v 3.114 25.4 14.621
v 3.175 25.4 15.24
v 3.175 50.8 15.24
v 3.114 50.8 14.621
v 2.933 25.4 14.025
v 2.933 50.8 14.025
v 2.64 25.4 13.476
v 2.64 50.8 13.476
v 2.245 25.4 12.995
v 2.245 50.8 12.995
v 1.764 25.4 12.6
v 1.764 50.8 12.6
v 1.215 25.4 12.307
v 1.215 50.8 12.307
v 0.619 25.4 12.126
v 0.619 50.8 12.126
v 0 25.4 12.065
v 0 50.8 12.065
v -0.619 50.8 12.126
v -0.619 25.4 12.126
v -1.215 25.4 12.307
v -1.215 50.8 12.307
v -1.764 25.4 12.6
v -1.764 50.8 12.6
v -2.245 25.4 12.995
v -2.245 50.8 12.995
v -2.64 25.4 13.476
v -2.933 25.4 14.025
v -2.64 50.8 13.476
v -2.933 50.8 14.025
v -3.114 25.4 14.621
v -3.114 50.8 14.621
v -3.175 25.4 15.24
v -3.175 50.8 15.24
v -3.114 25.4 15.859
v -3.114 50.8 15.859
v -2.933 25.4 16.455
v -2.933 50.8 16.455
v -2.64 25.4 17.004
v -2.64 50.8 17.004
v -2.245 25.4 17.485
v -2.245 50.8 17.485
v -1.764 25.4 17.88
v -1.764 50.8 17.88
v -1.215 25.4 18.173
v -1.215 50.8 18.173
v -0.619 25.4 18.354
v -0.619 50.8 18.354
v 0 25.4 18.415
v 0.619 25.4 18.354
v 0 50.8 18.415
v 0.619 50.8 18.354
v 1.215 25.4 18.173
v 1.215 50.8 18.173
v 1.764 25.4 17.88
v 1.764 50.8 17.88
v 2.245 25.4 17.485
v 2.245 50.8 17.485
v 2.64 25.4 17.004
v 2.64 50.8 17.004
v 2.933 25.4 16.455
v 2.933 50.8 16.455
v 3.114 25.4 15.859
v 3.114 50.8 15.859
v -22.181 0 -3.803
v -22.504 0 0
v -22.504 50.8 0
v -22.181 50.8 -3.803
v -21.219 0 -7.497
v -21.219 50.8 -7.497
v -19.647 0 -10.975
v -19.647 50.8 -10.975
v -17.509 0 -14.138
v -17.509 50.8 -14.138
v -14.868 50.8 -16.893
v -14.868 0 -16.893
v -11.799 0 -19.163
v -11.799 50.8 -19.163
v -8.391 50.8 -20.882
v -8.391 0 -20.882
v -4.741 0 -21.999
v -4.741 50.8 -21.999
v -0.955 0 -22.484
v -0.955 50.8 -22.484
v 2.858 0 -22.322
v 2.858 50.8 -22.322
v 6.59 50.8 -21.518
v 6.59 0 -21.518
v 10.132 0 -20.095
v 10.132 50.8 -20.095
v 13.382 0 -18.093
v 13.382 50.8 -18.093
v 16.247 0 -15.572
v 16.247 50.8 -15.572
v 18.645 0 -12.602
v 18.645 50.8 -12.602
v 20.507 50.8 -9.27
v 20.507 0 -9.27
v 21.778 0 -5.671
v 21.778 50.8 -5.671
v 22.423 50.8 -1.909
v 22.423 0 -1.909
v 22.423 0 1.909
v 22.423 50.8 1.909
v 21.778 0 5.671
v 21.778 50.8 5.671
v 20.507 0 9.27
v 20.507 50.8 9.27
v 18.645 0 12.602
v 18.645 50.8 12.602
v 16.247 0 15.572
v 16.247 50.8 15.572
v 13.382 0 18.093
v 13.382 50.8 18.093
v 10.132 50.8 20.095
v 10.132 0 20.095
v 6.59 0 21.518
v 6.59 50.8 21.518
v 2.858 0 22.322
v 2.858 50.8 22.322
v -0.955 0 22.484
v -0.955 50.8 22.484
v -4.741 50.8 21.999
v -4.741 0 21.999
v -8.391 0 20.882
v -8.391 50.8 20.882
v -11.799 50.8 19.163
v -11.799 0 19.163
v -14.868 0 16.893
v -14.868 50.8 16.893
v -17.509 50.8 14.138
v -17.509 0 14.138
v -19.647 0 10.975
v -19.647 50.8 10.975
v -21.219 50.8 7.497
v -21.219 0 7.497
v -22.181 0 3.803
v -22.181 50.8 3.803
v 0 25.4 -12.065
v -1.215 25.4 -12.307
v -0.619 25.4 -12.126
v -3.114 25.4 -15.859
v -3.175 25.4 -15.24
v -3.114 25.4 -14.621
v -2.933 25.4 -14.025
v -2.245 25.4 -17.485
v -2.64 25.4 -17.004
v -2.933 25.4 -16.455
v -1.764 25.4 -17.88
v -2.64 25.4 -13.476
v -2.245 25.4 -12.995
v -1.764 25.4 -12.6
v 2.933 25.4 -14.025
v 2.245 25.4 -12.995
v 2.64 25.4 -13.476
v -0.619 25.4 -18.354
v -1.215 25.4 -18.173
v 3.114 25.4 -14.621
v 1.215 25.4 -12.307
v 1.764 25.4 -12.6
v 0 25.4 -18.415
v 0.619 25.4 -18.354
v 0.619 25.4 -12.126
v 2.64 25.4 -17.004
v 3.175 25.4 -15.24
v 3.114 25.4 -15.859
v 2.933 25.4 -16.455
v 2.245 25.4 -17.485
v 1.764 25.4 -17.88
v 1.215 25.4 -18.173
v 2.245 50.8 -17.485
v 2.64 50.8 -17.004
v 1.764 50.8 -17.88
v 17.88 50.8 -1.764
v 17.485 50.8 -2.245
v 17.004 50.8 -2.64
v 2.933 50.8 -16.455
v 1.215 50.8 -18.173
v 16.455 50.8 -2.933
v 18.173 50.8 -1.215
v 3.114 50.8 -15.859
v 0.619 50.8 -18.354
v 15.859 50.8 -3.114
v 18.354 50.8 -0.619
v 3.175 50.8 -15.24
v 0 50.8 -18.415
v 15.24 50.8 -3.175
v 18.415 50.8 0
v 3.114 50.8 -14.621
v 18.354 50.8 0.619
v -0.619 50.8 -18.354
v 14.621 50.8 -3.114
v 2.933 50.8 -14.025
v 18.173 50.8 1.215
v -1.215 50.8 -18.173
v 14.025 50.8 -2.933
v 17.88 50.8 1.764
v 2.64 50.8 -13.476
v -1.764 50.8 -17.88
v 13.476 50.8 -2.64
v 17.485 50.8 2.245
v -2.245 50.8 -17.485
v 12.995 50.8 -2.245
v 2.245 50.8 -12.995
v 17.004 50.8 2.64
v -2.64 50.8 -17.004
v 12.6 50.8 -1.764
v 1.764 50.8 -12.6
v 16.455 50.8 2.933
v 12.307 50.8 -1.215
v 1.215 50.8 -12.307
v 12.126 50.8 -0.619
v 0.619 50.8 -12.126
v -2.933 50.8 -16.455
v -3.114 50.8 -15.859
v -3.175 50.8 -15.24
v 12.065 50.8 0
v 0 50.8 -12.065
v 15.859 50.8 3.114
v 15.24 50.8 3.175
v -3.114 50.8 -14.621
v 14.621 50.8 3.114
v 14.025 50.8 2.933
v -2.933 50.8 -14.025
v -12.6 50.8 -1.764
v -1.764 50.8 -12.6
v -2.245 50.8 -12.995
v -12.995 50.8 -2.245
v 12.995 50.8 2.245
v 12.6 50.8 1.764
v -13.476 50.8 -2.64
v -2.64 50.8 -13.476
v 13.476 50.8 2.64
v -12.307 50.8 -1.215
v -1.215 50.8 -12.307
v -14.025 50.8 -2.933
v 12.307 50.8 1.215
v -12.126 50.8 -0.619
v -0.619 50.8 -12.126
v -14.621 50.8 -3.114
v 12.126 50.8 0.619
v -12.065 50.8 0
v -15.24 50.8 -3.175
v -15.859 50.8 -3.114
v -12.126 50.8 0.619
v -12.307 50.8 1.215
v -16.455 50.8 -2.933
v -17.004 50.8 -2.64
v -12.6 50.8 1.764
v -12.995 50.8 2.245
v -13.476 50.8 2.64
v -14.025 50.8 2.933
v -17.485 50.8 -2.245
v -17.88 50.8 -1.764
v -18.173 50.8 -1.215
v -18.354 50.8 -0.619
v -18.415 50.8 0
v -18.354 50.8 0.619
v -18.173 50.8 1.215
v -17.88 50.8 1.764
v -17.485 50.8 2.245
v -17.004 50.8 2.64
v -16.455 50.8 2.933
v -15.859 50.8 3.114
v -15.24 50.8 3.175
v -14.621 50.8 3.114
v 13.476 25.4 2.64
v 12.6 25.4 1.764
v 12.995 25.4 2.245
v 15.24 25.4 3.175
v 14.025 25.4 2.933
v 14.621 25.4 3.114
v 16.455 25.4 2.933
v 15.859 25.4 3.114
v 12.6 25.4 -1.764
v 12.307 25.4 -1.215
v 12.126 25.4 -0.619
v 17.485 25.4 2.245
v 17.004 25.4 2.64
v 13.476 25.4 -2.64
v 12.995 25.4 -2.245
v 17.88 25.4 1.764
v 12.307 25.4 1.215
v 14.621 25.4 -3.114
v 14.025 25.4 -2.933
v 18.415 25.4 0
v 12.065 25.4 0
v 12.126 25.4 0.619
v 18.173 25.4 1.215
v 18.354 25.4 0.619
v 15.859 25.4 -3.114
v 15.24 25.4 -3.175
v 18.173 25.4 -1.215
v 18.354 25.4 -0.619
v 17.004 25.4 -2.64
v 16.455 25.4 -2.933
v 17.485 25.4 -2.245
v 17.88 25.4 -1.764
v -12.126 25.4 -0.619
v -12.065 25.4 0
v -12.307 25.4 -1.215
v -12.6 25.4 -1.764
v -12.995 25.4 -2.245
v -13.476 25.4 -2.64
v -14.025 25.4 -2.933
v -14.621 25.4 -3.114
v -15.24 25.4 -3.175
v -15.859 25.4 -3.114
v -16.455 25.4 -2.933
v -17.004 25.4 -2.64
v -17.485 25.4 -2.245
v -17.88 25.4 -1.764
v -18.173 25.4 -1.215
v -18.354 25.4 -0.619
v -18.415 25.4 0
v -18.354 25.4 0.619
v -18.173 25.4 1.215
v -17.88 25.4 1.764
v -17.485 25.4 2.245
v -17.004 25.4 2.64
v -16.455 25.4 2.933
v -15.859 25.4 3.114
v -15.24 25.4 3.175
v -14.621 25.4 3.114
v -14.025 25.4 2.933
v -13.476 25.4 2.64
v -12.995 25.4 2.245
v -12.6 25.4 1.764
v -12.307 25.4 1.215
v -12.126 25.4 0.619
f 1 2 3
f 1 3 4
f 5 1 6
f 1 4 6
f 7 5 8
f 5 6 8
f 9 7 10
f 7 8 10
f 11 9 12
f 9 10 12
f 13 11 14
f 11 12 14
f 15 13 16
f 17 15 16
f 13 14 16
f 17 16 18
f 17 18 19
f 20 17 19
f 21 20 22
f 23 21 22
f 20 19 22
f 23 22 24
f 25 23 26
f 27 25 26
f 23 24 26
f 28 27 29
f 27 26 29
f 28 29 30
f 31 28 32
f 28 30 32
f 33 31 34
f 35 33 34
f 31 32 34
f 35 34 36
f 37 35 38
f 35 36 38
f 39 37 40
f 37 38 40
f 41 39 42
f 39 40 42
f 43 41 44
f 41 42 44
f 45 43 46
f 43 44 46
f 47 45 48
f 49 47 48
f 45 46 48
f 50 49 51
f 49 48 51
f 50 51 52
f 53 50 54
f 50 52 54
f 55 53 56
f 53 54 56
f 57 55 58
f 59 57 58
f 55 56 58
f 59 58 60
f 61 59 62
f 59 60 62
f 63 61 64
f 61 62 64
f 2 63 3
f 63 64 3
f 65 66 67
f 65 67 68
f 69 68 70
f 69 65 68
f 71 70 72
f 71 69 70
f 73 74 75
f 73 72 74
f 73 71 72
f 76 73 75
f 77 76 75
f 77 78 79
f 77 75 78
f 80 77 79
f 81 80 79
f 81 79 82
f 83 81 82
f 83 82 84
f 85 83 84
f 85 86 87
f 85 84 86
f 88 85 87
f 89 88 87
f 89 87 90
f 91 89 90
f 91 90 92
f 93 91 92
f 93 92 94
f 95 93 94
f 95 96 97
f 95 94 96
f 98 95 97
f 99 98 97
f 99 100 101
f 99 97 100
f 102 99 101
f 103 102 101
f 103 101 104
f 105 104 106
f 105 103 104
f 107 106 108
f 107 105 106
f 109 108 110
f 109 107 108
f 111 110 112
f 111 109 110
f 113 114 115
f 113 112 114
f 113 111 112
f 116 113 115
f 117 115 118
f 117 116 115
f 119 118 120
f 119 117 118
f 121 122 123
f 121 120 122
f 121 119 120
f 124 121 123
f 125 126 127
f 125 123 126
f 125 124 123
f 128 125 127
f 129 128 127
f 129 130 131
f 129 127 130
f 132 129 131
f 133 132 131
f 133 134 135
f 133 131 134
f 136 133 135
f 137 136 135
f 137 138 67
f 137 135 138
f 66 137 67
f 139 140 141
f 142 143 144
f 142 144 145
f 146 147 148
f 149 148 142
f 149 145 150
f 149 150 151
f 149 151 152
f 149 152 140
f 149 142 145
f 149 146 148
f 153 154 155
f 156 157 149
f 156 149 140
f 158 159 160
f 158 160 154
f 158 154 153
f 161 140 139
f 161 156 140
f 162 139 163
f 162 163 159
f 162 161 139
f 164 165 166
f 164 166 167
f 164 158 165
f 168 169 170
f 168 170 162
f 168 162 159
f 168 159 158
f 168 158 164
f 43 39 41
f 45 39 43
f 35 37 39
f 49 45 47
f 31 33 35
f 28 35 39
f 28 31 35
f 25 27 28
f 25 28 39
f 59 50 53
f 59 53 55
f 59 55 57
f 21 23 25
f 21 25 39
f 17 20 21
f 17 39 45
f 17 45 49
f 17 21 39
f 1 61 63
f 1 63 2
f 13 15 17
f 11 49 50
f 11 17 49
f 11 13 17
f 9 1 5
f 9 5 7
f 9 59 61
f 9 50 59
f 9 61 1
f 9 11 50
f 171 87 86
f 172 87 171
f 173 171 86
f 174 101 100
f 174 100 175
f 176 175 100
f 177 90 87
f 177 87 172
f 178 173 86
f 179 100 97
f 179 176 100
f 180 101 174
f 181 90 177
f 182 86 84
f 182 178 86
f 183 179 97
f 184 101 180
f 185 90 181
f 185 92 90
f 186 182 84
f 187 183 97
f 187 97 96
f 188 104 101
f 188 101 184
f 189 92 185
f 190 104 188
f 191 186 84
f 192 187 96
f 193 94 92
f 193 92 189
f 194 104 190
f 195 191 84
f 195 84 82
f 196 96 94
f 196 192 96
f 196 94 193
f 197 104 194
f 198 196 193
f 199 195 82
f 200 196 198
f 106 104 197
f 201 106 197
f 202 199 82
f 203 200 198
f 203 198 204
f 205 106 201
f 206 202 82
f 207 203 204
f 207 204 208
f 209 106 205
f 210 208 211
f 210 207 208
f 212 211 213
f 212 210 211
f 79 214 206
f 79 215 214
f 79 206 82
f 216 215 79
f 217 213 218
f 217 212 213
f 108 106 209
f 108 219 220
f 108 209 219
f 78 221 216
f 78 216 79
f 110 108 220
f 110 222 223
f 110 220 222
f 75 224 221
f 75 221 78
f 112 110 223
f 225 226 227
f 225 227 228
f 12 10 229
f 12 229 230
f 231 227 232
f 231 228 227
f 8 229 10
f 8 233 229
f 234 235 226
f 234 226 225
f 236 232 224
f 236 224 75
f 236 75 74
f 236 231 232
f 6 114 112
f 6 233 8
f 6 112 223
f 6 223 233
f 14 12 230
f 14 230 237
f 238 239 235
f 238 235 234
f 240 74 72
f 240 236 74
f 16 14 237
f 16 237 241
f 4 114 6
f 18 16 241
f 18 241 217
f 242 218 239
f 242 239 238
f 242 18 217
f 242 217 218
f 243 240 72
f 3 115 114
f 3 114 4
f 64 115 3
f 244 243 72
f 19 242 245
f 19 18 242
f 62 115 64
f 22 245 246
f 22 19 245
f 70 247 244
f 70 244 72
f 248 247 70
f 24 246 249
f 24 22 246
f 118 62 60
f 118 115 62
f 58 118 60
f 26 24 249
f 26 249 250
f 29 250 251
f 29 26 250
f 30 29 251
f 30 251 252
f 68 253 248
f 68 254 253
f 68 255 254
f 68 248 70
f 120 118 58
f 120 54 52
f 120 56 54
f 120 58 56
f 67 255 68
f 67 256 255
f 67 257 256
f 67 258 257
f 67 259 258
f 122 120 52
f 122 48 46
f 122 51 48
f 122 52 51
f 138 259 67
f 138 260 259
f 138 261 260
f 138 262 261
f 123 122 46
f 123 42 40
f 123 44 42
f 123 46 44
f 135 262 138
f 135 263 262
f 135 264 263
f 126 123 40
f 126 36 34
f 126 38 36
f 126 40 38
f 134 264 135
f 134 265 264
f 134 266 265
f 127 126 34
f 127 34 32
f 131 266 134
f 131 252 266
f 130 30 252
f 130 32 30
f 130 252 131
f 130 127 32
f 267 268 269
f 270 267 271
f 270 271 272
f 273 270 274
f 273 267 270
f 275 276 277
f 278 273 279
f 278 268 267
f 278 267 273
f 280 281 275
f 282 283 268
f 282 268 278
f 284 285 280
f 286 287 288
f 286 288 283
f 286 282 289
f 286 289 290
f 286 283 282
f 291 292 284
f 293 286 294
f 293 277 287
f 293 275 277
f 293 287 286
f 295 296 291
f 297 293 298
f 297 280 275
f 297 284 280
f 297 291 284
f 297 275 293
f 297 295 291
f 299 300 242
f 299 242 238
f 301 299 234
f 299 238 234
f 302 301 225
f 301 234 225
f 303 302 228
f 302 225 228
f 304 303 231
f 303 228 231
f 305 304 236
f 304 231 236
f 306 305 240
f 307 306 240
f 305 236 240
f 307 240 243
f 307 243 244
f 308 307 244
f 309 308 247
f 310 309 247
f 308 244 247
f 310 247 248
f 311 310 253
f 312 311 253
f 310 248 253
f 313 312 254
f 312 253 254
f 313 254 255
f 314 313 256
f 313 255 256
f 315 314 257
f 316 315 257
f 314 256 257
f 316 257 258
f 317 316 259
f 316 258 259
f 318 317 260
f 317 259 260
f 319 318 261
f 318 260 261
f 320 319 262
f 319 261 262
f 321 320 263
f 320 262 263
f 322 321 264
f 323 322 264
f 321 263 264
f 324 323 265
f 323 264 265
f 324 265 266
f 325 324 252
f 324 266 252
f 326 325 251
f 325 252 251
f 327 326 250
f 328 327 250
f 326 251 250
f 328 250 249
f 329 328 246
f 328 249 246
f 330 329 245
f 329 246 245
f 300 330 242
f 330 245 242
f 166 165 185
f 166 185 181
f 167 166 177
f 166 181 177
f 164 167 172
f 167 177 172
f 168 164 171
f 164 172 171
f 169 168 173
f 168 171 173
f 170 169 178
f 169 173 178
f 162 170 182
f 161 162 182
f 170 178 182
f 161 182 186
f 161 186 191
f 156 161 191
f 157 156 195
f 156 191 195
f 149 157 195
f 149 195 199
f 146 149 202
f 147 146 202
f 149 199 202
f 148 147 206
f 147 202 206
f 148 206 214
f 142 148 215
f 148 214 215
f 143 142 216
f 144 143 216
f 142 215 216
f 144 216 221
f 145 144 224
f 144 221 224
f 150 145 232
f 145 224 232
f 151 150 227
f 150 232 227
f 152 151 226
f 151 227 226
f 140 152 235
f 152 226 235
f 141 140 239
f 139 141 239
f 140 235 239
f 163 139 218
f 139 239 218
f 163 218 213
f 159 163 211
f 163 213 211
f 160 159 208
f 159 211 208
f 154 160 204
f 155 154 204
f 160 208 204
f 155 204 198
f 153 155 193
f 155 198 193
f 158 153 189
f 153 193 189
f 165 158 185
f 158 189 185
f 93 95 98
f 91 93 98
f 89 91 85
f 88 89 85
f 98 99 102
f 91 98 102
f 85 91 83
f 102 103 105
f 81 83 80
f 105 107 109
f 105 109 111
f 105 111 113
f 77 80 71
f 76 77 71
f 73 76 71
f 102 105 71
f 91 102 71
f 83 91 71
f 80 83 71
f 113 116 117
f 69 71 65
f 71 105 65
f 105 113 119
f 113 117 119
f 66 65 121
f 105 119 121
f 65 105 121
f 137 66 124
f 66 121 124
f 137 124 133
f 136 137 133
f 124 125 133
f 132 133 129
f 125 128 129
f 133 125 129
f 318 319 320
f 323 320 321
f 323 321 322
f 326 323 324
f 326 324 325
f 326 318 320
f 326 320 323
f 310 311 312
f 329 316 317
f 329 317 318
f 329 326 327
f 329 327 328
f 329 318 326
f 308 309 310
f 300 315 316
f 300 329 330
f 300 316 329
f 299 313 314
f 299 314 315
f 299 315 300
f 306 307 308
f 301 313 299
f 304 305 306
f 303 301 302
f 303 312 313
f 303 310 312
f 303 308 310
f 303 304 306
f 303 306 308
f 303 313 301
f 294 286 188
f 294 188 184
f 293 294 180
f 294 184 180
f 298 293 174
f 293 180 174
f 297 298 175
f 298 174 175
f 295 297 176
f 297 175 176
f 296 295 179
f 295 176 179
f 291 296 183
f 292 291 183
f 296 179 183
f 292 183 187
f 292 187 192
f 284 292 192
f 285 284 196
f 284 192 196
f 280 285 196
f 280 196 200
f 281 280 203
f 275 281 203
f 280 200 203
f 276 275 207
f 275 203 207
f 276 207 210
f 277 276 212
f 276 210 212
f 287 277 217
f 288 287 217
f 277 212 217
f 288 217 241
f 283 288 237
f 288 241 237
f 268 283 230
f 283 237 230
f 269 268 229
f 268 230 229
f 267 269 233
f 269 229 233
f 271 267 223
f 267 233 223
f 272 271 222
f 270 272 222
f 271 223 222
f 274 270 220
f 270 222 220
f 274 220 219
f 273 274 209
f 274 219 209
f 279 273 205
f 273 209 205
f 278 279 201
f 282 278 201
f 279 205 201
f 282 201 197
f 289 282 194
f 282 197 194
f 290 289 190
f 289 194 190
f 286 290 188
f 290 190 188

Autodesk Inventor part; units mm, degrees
ref_plane "YZ Plane" through (0, 0, 0) normal (1, 0, 0) x (0, 1, 0)
ref_plane "XZ Plane" through (0, 0, 0) normal (0, 1, 0) x (-1, 0, 0)
ref_plane "XY Plane" through (0, 0, 0) normal (0, 0, 1) x (1, 0, 0)
sketch "Sketch1" plane through (0, 0, 0) normal (0, 1, 0) x (-1, 0, 0)
  circle A0 centre (0, 0) radius 22.5044
  dimension "d0" = 45.0088
extrude "Extrusion1" add sketch "Sketch1" along normal blind 50.8
sketch "Sketch4" plane through (0, 50.8, 0) normal (0, 1, 0) x (1, 0, 0)
  circle A0 centre (15.24, 0) radius 3.175
  circle A1 centre (0, 15.24) radius 3.175
  circle A2 centre (-15.24, 0) radius 3.175
  circle A3 centre (0, -15.24) radius 3.175
  point P0 (0, 0)
  dimension "d6" = 6.35
  dimension "d7" = 0
  dimension "d8" = 15.24
  dimension "d11" = 360
extrude "Extrusion3" cut sketch "Sketch4" against normal blind 25.4
properties part number "FrontPlatePostNoKey"
